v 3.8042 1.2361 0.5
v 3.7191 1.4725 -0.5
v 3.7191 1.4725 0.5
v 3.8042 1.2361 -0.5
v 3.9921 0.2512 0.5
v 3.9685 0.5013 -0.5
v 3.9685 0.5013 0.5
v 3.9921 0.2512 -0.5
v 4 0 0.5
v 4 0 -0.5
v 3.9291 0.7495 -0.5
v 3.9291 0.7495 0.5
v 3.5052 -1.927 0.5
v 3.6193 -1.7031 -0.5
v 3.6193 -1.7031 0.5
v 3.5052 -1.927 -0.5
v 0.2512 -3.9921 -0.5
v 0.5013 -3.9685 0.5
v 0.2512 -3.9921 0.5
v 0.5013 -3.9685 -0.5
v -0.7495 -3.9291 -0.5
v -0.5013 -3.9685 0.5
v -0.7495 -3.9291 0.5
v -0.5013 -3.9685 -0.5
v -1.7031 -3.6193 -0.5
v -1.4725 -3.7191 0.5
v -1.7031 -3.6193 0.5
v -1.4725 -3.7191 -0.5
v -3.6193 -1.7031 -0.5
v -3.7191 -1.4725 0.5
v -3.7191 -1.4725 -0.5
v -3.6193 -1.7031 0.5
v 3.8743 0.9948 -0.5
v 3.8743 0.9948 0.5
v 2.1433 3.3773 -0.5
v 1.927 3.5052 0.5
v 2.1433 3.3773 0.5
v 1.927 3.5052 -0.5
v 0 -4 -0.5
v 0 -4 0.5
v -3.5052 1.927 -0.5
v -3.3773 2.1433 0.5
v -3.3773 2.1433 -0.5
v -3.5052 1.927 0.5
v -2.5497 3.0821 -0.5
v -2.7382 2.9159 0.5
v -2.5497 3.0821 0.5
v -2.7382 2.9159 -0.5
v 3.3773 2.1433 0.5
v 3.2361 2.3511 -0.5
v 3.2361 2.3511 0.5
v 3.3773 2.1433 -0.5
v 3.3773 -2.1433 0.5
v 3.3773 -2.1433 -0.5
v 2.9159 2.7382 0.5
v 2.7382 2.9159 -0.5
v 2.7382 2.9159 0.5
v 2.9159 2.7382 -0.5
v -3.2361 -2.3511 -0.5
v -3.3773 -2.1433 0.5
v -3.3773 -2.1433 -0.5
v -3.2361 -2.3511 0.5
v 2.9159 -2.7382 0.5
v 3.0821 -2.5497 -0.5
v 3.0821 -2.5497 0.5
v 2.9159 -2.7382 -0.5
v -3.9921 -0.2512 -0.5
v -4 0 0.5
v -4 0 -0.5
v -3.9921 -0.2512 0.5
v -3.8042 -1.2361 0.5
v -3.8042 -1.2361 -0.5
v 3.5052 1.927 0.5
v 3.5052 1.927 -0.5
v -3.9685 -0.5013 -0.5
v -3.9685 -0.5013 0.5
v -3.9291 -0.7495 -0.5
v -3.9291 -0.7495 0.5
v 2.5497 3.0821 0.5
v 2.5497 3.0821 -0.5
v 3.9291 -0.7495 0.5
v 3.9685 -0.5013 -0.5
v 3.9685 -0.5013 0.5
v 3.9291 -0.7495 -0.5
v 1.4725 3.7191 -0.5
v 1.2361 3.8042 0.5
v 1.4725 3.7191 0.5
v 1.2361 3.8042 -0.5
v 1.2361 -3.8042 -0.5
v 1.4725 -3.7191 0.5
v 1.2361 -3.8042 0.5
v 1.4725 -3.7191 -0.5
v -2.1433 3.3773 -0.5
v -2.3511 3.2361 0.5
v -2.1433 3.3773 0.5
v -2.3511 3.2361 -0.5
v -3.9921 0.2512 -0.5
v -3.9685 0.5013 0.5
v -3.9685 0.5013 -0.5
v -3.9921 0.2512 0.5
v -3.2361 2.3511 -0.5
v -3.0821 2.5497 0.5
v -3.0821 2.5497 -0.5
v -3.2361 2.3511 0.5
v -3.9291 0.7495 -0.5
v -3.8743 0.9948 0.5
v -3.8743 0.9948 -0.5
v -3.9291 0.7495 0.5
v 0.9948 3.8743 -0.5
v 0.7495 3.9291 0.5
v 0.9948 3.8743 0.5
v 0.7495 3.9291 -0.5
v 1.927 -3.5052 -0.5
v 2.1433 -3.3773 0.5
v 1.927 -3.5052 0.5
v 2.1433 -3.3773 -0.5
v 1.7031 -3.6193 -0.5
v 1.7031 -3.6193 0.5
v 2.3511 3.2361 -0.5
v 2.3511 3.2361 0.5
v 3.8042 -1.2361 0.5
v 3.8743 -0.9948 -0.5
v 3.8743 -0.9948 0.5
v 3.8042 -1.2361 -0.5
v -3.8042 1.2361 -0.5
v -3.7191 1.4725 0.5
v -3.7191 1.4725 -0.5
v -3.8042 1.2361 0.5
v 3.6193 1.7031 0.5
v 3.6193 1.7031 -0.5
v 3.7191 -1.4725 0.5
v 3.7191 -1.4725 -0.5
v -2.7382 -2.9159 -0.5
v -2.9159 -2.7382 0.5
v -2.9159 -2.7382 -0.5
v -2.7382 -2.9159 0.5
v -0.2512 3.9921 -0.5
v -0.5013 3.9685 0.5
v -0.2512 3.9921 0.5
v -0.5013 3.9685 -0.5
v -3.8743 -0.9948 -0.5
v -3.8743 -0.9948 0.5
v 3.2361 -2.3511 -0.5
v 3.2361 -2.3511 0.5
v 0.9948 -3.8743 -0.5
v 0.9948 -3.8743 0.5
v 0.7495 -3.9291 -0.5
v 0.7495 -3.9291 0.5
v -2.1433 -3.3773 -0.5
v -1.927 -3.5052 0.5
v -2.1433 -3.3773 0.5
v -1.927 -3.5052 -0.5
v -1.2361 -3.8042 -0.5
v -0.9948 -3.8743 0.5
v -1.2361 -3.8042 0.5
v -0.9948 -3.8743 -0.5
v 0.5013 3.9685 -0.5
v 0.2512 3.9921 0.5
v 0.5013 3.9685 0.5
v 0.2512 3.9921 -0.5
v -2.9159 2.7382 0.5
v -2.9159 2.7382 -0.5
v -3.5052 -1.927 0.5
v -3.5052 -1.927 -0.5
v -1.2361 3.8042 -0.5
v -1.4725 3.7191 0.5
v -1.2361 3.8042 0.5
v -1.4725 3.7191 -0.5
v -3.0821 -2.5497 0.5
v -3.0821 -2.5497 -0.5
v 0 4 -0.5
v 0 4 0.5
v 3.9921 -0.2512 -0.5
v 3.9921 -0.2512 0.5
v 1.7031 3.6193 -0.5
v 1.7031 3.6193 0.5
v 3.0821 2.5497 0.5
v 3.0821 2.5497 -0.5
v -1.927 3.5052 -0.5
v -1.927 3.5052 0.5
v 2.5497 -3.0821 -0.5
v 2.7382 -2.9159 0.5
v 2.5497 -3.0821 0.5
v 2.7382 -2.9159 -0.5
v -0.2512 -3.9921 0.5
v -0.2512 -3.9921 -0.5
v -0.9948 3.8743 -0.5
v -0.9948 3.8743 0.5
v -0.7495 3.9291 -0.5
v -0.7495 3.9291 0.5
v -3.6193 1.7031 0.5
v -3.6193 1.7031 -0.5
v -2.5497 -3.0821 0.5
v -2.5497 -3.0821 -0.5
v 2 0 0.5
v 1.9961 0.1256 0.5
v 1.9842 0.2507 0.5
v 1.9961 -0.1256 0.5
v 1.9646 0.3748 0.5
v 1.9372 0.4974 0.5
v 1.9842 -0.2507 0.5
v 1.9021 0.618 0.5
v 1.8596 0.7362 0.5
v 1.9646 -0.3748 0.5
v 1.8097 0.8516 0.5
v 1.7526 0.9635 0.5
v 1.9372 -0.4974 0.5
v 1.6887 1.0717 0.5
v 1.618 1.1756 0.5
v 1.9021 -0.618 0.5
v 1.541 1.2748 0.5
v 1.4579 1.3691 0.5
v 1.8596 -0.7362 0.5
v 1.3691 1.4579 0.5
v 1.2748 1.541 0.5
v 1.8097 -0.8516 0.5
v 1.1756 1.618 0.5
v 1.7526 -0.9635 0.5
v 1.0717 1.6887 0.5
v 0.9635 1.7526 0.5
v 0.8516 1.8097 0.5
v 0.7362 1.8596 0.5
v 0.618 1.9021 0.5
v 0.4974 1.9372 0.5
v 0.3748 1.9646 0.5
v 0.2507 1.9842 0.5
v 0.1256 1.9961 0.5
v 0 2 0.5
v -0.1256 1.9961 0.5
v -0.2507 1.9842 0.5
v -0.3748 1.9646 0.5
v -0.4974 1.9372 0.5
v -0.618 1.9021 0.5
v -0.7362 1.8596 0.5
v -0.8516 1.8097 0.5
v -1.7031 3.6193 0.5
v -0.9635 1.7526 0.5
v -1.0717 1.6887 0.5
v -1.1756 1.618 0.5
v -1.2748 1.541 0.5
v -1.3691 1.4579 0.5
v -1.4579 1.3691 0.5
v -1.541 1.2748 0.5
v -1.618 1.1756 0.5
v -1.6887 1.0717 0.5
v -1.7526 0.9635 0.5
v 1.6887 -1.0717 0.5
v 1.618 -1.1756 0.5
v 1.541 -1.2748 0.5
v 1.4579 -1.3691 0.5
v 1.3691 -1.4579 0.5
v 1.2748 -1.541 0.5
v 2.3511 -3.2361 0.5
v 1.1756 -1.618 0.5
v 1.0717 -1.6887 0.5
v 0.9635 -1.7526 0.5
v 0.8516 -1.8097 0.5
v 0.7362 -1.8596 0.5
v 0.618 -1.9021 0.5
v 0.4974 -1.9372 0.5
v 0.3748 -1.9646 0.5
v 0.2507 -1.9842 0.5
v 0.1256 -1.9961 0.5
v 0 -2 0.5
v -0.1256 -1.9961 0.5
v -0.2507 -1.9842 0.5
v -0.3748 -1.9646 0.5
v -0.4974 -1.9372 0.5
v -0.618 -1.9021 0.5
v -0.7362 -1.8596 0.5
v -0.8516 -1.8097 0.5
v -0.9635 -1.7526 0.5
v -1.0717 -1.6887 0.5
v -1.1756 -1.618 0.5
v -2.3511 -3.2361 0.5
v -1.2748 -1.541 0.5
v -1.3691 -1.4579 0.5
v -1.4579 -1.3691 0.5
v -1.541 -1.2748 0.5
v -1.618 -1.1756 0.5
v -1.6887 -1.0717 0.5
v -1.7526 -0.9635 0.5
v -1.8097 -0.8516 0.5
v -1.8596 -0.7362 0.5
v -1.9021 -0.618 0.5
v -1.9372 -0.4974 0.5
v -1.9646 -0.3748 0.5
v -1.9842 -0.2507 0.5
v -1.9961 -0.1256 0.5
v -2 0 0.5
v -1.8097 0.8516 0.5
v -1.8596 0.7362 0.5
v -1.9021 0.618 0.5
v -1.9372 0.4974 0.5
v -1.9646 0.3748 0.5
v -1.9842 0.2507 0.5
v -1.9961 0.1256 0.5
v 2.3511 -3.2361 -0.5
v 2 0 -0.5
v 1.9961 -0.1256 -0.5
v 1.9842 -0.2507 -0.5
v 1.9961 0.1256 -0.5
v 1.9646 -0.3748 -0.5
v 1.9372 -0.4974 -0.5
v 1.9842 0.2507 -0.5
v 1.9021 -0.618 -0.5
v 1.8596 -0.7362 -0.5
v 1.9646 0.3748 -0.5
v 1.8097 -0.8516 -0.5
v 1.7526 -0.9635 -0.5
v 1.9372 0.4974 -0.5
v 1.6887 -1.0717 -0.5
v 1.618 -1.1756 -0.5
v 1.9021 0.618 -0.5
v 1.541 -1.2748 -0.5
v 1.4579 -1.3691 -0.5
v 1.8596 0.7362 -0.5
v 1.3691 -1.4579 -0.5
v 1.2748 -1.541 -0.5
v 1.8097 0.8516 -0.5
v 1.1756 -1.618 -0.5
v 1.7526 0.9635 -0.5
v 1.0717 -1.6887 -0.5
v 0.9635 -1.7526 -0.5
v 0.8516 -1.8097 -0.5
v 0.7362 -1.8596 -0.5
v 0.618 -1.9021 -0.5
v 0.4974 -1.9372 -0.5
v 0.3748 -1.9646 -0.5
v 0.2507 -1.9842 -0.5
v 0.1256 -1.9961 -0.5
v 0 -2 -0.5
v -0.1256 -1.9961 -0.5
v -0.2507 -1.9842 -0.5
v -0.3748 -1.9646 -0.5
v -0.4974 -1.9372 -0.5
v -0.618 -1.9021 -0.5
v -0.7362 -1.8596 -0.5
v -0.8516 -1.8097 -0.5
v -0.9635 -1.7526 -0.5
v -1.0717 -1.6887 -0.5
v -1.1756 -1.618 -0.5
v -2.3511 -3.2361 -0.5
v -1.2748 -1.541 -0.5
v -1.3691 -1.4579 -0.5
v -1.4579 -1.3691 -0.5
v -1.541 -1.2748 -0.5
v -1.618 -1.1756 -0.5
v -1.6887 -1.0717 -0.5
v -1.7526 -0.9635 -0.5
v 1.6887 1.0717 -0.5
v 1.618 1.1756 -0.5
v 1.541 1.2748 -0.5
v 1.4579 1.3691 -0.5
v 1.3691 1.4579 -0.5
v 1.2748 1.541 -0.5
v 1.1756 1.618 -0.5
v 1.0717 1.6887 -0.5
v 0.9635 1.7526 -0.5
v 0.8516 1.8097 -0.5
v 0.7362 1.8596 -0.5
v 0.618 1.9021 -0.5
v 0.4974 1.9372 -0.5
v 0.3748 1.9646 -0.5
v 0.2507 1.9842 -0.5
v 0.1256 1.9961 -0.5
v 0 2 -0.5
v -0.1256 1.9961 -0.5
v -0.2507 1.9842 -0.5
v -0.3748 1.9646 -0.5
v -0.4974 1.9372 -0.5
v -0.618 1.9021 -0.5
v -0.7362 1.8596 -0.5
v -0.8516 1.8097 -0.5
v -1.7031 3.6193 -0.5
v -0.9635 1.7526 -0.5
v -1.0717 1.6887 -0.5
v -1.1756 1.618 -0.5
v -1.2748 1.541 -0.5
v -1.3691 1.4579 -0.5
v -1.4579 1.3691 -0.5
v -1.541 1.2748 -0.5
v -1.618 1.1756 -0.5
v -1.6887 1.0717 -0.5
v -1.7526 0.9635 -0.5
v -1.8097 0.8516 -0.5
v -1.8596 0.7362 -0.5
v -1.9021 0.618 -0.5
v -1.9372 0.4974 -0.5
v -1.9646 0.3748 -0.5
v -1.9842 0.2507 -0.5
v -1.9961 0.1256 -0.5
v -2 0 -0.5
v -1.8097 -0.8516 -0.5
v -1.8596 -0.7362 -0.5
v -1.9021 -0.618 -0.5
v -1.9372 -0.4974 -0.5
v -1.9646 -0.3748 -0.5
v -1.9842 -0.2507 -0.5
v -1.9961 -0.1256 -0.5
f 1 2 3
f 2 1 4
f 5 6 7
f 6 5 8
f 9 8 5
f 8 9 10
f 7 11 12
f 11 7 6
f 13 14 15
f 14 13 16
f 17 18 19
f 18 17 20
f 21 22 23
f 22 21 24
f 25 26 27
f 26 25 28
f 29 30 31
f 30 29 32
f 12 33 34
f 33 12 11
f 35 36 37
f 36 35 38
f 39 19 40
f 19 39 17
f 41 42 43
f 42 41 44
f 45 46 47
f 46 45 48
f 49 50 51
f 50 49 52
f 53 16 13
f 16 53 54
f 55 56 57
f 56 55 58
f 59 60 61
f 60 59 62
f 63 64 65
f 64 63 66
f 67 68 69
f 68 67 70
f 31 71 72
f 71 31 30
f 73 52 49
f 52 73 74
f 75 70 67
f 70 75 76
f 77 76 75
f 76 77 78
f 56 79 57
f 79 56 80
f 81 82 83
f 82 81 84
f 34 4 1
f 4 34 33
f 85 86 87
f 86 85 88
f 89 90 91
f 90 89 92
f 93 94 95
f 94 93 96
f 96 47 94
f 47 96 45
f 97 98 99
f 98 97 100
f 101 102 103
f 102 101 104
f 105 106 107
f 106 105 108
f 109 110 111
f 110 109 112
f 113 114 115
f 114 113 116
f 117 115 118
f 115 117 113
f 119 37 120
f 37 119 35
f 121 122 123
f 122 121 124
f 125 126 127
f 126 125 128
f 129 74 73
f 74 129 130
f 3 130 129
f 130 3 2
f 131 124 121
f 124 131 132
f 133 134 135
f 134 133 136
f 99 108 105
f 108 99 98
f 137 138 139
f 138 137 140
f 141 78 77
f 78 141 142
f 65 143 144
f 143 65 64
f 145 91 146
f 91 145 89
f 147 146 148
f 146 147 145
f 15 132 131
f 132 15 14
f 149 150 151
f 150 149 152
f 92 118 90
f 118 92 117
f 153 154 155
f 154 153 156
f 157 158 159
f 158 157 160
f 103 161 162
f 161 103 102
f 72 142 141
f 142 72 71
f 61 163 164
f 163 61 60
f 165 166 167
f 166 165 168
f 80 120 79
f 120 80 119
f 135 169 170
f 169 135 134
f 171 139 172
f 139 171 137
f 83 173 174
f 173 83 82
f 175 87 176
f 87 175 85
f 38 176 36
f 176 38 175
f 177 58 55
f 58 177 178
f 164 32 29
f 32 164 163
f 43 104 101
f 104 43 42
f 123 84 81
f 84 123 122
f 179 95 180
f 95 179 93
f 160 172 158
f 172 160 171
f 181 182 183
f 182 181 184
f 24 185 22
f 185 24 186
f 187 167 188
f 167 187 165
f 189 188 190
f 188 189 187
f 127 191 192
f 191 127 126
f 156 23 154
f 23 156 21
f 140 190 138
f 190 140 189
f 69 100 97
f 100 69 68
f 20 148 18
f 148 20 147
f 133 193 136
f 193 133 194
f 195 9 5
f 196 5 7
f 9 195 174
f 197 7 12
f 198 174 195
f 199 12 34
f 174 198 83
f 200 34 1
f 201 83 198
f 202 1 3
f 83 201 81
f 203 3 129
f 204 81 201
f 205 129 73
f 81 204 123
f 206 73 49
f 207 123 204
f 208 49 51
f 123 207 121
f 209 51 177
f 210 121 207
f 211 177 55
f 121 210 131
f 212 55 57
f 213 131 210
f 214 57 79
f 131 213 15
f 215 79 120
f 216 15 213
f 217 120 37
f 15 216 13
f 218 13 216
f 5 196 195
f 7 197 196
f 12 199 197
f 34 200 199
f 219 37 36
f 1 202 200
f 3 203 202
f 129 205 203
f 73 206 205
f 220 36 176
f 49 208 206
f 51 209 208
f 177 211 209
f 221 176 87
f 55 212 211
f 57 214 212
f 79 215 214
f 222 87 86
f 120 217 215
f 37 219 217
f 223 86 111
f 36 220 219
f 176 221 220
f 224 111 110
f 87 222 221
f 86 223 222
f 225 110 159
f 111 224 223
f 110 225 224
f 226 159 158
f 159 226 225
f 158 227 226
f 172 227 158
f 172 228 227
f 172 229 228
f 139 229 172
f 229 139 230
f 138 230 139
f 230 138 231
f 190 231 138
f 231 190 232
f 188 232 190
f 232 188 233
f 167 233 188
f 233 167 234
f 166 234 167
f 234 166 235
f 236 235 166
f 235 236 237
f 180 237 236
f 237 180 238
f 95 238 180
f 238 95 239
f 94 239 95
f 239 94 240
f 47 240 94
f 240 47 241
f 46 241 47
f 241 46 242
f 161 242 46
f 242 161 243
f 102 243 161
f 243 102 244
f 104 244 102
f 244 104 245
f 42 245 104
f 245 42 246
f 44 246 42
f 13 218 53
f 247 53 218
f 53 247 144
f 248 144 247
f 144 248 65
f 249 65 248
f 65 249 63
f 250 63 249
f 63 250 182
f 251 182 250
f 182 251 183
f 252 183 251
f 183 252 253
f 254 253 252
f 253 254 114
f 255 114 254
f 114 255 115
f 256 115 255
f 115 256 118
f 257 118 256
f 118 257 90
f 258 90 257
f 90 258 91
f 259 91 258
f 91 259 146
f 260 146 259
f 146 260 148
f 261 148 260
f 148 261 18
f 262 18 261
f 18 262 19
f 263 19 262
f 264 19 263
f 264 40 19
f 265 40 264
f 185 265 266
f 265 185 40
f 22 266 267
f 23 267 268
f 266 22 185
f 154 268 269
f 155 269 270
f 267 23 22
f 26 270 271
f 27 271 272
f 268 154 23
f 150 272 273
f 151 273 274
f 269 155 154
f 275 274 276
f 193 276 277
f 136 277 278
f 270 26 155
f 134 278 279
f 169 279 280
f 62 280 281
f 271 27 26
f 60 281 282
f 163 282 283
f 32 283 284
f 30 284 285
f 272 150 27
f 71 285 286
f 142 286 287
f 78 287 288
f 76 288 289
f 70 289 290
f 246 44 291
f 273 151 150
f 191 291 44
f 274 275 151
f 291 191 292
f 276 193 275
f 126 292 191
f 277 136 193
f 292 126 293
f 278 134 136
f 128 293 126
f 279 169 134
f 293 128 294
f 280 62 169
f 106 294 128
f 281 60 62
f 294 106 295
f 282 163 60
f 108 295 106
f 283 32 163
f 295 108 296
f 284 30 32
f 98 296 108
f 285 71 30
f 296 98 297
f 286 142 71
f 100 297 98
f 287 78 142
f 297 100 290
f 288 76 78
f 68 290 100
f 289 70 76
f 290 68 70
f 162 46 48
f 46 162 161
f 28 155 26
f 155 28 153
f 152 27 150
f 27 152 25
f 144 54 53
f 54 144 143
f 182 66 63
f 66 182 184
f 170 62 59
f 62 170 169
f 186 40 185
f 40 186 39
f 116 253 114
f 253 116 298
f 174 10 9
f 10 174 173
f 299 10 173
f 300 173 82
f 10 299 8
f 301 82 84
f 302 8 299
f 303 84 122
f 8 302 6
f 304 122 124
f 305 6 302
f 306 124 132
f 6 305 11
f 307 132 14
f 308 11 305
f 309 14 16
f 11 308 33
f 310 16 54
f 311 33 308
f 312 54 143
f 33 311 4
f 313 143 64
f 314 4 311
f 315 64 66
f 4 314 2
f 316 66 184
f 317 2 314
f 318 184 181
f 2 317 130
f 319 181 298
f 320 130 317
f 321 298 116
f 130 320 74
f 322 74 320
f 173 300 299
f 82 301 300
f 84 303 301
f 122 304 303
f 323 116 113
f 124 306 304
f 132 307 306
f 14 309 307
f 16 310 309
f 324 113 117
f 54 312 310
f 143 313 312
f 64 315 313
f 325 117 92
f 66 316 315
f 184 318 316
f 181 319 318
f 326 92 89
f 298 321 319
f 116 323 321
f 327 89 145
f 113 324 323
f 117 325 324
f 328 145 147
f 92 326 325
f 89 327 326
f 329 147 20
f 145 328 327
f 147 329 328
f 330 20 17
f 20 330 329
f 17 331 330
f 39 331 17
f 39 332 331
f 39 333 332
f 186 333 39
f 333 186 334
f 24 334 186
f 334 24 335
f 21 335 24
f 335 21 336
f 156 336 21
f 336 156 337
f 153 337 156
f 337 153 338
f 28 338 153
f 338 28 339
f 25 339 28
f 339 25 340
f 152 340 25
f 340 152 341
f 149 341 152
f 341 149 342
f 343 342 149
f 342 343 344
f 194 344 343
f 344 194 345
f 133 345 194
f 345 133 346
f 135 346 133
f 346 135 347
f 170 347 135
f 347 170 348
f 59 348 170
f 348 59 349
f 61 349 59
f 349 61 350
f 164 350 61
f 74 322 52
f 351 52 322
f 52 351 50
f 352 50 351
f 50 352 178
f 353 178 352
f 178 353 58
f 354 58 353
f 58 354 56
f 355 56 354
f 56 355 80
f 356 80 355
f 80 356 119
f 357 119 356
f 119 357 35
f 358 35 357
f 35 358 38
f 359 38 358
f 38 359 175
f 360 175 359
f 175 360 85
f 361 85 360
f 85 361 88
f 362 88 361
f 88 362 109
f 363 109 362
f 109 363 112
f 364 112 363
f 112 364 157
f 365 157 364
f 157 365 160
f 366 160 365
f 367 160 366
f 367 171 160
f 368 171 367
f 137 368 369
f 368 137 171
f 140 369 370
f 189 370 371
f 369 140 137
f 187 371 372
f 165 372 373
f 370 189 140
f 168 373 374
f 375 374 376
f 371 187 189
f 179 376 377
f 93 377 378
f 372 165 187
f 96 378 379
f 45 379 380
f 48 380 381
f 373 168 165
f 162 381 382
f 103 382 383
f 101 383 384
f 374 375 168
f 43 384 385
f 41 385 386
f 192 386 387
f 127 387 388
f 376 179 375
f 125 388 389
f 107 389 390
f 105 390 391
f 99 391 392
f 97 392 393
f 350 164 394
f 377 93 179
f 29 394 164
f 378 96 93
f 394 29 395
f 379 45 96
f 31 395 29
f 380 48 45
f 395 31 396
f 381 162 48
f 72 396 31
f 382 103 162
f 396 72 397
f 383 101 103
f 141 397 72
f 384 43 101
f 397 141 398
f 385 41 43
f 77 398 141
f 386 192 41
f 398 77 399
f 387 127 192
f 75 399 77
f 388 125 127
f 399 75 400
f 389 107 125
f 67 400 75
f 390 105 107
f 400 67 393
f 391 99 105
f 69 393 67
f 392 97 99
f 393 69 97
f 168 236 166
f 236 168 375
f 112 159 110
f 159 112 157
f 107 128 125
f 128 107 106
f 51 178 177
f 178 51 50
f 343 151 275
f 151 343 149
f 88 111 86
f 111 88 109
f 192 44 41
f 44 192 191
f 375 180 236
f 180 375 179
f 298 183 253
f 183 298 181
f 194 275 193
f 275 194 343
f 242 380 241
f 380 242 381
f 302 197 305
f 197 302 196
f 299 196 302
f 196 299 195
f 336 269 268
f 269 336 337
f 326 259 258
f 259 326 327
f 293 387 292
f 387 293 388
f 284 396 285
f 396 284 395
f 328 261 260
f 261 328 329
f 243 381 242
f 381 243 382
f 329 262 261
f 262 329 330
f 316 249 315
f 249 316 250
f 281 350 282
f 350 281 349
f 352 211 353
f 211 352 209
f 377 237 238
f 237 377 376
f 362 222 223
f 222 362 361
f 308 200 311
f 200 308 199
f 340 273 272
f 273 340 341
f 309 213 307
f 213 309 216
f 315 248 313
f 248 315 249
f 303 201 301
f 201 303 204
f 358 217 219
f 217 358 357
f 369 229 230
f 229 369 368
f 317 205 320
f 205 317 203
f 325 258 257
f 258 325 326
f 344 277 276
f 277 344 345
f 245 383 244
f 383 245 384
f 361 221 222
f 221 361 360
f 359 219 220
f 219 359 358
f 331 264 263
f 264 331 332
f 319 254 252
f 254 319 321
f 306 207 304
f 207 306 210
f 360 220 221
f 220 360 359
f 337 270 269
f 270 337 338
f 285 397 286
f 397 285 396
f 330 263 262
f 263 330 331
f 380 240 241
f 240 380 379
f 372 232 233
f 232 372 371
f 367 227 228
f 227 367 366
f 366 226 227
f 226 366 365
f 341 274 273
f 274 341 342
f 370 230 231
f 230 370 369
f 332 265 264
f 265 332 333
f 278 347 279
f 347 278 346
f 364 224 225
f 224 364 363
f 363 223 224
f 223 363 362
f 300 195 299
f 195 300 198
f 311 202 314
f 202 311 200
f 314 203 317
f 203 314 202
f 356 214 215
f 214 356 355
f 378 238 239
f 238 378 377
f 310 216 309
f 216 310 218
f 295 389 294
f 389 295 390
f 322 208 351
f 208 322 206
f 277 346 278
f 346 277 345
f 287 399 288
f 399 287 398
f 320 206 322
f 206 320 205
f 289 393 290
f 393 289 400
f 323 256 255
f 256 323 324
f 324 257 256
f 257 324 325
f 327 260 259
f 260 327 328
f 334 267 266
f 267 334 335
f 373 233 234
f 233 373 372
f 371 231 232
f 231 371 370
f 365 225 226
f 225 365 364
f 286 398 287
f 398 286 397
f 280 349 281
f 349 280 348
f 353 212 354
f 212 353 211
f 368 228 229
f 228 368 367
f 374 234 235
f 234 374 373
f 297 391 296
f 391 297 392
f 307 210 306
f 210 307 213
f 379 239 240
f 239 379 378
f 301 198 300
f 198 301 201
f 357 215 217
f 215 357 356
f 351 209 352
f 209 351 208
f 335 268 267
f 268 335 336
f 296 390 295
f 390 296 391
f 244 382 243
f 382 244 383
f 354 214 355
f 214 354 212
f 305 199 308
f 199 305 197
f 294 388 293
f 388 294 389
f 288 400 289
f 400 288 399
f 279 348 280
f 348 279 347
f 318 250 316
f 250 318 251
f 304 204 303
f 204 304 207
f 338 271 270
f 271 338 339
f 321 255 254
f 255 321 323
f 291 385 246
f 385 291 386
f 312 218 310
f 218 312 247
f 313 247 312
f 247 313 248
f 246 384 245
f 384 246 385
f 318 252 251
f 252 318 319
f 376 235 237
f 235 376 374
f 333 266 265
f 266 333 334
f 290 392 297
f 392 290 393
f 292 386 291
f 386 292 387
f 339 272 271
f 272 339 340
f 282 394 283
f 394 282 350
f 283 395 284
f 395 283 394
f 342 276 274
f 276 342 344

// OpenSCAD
//Customizable Gasket
// This is a simple open-source parametric gasket

//CUSTOMIZER VARIABLES
//Defines the height of the gasket
gasket_thickness=1; //[1:10] 

//Defines the gasket outer diameter
gasket_outer_diameter=2; //[2:100]

//Defines the gasket inner diameter
gasket_inner_diameter=1; //Numeric value smaller than Gasket Outer Diameter

//CUSTOMIZER VARIABLES END

module gasket()
{
	difference()
	{
	cylinder(h=gasket_thickness, r=gasket_outer_diameter*2, center=true, $fn=100);
	cylinder(h=gasket_thickness, r=gasket_inner_diameter*2, center=true, $fn=100);
	}
}

gasket();
